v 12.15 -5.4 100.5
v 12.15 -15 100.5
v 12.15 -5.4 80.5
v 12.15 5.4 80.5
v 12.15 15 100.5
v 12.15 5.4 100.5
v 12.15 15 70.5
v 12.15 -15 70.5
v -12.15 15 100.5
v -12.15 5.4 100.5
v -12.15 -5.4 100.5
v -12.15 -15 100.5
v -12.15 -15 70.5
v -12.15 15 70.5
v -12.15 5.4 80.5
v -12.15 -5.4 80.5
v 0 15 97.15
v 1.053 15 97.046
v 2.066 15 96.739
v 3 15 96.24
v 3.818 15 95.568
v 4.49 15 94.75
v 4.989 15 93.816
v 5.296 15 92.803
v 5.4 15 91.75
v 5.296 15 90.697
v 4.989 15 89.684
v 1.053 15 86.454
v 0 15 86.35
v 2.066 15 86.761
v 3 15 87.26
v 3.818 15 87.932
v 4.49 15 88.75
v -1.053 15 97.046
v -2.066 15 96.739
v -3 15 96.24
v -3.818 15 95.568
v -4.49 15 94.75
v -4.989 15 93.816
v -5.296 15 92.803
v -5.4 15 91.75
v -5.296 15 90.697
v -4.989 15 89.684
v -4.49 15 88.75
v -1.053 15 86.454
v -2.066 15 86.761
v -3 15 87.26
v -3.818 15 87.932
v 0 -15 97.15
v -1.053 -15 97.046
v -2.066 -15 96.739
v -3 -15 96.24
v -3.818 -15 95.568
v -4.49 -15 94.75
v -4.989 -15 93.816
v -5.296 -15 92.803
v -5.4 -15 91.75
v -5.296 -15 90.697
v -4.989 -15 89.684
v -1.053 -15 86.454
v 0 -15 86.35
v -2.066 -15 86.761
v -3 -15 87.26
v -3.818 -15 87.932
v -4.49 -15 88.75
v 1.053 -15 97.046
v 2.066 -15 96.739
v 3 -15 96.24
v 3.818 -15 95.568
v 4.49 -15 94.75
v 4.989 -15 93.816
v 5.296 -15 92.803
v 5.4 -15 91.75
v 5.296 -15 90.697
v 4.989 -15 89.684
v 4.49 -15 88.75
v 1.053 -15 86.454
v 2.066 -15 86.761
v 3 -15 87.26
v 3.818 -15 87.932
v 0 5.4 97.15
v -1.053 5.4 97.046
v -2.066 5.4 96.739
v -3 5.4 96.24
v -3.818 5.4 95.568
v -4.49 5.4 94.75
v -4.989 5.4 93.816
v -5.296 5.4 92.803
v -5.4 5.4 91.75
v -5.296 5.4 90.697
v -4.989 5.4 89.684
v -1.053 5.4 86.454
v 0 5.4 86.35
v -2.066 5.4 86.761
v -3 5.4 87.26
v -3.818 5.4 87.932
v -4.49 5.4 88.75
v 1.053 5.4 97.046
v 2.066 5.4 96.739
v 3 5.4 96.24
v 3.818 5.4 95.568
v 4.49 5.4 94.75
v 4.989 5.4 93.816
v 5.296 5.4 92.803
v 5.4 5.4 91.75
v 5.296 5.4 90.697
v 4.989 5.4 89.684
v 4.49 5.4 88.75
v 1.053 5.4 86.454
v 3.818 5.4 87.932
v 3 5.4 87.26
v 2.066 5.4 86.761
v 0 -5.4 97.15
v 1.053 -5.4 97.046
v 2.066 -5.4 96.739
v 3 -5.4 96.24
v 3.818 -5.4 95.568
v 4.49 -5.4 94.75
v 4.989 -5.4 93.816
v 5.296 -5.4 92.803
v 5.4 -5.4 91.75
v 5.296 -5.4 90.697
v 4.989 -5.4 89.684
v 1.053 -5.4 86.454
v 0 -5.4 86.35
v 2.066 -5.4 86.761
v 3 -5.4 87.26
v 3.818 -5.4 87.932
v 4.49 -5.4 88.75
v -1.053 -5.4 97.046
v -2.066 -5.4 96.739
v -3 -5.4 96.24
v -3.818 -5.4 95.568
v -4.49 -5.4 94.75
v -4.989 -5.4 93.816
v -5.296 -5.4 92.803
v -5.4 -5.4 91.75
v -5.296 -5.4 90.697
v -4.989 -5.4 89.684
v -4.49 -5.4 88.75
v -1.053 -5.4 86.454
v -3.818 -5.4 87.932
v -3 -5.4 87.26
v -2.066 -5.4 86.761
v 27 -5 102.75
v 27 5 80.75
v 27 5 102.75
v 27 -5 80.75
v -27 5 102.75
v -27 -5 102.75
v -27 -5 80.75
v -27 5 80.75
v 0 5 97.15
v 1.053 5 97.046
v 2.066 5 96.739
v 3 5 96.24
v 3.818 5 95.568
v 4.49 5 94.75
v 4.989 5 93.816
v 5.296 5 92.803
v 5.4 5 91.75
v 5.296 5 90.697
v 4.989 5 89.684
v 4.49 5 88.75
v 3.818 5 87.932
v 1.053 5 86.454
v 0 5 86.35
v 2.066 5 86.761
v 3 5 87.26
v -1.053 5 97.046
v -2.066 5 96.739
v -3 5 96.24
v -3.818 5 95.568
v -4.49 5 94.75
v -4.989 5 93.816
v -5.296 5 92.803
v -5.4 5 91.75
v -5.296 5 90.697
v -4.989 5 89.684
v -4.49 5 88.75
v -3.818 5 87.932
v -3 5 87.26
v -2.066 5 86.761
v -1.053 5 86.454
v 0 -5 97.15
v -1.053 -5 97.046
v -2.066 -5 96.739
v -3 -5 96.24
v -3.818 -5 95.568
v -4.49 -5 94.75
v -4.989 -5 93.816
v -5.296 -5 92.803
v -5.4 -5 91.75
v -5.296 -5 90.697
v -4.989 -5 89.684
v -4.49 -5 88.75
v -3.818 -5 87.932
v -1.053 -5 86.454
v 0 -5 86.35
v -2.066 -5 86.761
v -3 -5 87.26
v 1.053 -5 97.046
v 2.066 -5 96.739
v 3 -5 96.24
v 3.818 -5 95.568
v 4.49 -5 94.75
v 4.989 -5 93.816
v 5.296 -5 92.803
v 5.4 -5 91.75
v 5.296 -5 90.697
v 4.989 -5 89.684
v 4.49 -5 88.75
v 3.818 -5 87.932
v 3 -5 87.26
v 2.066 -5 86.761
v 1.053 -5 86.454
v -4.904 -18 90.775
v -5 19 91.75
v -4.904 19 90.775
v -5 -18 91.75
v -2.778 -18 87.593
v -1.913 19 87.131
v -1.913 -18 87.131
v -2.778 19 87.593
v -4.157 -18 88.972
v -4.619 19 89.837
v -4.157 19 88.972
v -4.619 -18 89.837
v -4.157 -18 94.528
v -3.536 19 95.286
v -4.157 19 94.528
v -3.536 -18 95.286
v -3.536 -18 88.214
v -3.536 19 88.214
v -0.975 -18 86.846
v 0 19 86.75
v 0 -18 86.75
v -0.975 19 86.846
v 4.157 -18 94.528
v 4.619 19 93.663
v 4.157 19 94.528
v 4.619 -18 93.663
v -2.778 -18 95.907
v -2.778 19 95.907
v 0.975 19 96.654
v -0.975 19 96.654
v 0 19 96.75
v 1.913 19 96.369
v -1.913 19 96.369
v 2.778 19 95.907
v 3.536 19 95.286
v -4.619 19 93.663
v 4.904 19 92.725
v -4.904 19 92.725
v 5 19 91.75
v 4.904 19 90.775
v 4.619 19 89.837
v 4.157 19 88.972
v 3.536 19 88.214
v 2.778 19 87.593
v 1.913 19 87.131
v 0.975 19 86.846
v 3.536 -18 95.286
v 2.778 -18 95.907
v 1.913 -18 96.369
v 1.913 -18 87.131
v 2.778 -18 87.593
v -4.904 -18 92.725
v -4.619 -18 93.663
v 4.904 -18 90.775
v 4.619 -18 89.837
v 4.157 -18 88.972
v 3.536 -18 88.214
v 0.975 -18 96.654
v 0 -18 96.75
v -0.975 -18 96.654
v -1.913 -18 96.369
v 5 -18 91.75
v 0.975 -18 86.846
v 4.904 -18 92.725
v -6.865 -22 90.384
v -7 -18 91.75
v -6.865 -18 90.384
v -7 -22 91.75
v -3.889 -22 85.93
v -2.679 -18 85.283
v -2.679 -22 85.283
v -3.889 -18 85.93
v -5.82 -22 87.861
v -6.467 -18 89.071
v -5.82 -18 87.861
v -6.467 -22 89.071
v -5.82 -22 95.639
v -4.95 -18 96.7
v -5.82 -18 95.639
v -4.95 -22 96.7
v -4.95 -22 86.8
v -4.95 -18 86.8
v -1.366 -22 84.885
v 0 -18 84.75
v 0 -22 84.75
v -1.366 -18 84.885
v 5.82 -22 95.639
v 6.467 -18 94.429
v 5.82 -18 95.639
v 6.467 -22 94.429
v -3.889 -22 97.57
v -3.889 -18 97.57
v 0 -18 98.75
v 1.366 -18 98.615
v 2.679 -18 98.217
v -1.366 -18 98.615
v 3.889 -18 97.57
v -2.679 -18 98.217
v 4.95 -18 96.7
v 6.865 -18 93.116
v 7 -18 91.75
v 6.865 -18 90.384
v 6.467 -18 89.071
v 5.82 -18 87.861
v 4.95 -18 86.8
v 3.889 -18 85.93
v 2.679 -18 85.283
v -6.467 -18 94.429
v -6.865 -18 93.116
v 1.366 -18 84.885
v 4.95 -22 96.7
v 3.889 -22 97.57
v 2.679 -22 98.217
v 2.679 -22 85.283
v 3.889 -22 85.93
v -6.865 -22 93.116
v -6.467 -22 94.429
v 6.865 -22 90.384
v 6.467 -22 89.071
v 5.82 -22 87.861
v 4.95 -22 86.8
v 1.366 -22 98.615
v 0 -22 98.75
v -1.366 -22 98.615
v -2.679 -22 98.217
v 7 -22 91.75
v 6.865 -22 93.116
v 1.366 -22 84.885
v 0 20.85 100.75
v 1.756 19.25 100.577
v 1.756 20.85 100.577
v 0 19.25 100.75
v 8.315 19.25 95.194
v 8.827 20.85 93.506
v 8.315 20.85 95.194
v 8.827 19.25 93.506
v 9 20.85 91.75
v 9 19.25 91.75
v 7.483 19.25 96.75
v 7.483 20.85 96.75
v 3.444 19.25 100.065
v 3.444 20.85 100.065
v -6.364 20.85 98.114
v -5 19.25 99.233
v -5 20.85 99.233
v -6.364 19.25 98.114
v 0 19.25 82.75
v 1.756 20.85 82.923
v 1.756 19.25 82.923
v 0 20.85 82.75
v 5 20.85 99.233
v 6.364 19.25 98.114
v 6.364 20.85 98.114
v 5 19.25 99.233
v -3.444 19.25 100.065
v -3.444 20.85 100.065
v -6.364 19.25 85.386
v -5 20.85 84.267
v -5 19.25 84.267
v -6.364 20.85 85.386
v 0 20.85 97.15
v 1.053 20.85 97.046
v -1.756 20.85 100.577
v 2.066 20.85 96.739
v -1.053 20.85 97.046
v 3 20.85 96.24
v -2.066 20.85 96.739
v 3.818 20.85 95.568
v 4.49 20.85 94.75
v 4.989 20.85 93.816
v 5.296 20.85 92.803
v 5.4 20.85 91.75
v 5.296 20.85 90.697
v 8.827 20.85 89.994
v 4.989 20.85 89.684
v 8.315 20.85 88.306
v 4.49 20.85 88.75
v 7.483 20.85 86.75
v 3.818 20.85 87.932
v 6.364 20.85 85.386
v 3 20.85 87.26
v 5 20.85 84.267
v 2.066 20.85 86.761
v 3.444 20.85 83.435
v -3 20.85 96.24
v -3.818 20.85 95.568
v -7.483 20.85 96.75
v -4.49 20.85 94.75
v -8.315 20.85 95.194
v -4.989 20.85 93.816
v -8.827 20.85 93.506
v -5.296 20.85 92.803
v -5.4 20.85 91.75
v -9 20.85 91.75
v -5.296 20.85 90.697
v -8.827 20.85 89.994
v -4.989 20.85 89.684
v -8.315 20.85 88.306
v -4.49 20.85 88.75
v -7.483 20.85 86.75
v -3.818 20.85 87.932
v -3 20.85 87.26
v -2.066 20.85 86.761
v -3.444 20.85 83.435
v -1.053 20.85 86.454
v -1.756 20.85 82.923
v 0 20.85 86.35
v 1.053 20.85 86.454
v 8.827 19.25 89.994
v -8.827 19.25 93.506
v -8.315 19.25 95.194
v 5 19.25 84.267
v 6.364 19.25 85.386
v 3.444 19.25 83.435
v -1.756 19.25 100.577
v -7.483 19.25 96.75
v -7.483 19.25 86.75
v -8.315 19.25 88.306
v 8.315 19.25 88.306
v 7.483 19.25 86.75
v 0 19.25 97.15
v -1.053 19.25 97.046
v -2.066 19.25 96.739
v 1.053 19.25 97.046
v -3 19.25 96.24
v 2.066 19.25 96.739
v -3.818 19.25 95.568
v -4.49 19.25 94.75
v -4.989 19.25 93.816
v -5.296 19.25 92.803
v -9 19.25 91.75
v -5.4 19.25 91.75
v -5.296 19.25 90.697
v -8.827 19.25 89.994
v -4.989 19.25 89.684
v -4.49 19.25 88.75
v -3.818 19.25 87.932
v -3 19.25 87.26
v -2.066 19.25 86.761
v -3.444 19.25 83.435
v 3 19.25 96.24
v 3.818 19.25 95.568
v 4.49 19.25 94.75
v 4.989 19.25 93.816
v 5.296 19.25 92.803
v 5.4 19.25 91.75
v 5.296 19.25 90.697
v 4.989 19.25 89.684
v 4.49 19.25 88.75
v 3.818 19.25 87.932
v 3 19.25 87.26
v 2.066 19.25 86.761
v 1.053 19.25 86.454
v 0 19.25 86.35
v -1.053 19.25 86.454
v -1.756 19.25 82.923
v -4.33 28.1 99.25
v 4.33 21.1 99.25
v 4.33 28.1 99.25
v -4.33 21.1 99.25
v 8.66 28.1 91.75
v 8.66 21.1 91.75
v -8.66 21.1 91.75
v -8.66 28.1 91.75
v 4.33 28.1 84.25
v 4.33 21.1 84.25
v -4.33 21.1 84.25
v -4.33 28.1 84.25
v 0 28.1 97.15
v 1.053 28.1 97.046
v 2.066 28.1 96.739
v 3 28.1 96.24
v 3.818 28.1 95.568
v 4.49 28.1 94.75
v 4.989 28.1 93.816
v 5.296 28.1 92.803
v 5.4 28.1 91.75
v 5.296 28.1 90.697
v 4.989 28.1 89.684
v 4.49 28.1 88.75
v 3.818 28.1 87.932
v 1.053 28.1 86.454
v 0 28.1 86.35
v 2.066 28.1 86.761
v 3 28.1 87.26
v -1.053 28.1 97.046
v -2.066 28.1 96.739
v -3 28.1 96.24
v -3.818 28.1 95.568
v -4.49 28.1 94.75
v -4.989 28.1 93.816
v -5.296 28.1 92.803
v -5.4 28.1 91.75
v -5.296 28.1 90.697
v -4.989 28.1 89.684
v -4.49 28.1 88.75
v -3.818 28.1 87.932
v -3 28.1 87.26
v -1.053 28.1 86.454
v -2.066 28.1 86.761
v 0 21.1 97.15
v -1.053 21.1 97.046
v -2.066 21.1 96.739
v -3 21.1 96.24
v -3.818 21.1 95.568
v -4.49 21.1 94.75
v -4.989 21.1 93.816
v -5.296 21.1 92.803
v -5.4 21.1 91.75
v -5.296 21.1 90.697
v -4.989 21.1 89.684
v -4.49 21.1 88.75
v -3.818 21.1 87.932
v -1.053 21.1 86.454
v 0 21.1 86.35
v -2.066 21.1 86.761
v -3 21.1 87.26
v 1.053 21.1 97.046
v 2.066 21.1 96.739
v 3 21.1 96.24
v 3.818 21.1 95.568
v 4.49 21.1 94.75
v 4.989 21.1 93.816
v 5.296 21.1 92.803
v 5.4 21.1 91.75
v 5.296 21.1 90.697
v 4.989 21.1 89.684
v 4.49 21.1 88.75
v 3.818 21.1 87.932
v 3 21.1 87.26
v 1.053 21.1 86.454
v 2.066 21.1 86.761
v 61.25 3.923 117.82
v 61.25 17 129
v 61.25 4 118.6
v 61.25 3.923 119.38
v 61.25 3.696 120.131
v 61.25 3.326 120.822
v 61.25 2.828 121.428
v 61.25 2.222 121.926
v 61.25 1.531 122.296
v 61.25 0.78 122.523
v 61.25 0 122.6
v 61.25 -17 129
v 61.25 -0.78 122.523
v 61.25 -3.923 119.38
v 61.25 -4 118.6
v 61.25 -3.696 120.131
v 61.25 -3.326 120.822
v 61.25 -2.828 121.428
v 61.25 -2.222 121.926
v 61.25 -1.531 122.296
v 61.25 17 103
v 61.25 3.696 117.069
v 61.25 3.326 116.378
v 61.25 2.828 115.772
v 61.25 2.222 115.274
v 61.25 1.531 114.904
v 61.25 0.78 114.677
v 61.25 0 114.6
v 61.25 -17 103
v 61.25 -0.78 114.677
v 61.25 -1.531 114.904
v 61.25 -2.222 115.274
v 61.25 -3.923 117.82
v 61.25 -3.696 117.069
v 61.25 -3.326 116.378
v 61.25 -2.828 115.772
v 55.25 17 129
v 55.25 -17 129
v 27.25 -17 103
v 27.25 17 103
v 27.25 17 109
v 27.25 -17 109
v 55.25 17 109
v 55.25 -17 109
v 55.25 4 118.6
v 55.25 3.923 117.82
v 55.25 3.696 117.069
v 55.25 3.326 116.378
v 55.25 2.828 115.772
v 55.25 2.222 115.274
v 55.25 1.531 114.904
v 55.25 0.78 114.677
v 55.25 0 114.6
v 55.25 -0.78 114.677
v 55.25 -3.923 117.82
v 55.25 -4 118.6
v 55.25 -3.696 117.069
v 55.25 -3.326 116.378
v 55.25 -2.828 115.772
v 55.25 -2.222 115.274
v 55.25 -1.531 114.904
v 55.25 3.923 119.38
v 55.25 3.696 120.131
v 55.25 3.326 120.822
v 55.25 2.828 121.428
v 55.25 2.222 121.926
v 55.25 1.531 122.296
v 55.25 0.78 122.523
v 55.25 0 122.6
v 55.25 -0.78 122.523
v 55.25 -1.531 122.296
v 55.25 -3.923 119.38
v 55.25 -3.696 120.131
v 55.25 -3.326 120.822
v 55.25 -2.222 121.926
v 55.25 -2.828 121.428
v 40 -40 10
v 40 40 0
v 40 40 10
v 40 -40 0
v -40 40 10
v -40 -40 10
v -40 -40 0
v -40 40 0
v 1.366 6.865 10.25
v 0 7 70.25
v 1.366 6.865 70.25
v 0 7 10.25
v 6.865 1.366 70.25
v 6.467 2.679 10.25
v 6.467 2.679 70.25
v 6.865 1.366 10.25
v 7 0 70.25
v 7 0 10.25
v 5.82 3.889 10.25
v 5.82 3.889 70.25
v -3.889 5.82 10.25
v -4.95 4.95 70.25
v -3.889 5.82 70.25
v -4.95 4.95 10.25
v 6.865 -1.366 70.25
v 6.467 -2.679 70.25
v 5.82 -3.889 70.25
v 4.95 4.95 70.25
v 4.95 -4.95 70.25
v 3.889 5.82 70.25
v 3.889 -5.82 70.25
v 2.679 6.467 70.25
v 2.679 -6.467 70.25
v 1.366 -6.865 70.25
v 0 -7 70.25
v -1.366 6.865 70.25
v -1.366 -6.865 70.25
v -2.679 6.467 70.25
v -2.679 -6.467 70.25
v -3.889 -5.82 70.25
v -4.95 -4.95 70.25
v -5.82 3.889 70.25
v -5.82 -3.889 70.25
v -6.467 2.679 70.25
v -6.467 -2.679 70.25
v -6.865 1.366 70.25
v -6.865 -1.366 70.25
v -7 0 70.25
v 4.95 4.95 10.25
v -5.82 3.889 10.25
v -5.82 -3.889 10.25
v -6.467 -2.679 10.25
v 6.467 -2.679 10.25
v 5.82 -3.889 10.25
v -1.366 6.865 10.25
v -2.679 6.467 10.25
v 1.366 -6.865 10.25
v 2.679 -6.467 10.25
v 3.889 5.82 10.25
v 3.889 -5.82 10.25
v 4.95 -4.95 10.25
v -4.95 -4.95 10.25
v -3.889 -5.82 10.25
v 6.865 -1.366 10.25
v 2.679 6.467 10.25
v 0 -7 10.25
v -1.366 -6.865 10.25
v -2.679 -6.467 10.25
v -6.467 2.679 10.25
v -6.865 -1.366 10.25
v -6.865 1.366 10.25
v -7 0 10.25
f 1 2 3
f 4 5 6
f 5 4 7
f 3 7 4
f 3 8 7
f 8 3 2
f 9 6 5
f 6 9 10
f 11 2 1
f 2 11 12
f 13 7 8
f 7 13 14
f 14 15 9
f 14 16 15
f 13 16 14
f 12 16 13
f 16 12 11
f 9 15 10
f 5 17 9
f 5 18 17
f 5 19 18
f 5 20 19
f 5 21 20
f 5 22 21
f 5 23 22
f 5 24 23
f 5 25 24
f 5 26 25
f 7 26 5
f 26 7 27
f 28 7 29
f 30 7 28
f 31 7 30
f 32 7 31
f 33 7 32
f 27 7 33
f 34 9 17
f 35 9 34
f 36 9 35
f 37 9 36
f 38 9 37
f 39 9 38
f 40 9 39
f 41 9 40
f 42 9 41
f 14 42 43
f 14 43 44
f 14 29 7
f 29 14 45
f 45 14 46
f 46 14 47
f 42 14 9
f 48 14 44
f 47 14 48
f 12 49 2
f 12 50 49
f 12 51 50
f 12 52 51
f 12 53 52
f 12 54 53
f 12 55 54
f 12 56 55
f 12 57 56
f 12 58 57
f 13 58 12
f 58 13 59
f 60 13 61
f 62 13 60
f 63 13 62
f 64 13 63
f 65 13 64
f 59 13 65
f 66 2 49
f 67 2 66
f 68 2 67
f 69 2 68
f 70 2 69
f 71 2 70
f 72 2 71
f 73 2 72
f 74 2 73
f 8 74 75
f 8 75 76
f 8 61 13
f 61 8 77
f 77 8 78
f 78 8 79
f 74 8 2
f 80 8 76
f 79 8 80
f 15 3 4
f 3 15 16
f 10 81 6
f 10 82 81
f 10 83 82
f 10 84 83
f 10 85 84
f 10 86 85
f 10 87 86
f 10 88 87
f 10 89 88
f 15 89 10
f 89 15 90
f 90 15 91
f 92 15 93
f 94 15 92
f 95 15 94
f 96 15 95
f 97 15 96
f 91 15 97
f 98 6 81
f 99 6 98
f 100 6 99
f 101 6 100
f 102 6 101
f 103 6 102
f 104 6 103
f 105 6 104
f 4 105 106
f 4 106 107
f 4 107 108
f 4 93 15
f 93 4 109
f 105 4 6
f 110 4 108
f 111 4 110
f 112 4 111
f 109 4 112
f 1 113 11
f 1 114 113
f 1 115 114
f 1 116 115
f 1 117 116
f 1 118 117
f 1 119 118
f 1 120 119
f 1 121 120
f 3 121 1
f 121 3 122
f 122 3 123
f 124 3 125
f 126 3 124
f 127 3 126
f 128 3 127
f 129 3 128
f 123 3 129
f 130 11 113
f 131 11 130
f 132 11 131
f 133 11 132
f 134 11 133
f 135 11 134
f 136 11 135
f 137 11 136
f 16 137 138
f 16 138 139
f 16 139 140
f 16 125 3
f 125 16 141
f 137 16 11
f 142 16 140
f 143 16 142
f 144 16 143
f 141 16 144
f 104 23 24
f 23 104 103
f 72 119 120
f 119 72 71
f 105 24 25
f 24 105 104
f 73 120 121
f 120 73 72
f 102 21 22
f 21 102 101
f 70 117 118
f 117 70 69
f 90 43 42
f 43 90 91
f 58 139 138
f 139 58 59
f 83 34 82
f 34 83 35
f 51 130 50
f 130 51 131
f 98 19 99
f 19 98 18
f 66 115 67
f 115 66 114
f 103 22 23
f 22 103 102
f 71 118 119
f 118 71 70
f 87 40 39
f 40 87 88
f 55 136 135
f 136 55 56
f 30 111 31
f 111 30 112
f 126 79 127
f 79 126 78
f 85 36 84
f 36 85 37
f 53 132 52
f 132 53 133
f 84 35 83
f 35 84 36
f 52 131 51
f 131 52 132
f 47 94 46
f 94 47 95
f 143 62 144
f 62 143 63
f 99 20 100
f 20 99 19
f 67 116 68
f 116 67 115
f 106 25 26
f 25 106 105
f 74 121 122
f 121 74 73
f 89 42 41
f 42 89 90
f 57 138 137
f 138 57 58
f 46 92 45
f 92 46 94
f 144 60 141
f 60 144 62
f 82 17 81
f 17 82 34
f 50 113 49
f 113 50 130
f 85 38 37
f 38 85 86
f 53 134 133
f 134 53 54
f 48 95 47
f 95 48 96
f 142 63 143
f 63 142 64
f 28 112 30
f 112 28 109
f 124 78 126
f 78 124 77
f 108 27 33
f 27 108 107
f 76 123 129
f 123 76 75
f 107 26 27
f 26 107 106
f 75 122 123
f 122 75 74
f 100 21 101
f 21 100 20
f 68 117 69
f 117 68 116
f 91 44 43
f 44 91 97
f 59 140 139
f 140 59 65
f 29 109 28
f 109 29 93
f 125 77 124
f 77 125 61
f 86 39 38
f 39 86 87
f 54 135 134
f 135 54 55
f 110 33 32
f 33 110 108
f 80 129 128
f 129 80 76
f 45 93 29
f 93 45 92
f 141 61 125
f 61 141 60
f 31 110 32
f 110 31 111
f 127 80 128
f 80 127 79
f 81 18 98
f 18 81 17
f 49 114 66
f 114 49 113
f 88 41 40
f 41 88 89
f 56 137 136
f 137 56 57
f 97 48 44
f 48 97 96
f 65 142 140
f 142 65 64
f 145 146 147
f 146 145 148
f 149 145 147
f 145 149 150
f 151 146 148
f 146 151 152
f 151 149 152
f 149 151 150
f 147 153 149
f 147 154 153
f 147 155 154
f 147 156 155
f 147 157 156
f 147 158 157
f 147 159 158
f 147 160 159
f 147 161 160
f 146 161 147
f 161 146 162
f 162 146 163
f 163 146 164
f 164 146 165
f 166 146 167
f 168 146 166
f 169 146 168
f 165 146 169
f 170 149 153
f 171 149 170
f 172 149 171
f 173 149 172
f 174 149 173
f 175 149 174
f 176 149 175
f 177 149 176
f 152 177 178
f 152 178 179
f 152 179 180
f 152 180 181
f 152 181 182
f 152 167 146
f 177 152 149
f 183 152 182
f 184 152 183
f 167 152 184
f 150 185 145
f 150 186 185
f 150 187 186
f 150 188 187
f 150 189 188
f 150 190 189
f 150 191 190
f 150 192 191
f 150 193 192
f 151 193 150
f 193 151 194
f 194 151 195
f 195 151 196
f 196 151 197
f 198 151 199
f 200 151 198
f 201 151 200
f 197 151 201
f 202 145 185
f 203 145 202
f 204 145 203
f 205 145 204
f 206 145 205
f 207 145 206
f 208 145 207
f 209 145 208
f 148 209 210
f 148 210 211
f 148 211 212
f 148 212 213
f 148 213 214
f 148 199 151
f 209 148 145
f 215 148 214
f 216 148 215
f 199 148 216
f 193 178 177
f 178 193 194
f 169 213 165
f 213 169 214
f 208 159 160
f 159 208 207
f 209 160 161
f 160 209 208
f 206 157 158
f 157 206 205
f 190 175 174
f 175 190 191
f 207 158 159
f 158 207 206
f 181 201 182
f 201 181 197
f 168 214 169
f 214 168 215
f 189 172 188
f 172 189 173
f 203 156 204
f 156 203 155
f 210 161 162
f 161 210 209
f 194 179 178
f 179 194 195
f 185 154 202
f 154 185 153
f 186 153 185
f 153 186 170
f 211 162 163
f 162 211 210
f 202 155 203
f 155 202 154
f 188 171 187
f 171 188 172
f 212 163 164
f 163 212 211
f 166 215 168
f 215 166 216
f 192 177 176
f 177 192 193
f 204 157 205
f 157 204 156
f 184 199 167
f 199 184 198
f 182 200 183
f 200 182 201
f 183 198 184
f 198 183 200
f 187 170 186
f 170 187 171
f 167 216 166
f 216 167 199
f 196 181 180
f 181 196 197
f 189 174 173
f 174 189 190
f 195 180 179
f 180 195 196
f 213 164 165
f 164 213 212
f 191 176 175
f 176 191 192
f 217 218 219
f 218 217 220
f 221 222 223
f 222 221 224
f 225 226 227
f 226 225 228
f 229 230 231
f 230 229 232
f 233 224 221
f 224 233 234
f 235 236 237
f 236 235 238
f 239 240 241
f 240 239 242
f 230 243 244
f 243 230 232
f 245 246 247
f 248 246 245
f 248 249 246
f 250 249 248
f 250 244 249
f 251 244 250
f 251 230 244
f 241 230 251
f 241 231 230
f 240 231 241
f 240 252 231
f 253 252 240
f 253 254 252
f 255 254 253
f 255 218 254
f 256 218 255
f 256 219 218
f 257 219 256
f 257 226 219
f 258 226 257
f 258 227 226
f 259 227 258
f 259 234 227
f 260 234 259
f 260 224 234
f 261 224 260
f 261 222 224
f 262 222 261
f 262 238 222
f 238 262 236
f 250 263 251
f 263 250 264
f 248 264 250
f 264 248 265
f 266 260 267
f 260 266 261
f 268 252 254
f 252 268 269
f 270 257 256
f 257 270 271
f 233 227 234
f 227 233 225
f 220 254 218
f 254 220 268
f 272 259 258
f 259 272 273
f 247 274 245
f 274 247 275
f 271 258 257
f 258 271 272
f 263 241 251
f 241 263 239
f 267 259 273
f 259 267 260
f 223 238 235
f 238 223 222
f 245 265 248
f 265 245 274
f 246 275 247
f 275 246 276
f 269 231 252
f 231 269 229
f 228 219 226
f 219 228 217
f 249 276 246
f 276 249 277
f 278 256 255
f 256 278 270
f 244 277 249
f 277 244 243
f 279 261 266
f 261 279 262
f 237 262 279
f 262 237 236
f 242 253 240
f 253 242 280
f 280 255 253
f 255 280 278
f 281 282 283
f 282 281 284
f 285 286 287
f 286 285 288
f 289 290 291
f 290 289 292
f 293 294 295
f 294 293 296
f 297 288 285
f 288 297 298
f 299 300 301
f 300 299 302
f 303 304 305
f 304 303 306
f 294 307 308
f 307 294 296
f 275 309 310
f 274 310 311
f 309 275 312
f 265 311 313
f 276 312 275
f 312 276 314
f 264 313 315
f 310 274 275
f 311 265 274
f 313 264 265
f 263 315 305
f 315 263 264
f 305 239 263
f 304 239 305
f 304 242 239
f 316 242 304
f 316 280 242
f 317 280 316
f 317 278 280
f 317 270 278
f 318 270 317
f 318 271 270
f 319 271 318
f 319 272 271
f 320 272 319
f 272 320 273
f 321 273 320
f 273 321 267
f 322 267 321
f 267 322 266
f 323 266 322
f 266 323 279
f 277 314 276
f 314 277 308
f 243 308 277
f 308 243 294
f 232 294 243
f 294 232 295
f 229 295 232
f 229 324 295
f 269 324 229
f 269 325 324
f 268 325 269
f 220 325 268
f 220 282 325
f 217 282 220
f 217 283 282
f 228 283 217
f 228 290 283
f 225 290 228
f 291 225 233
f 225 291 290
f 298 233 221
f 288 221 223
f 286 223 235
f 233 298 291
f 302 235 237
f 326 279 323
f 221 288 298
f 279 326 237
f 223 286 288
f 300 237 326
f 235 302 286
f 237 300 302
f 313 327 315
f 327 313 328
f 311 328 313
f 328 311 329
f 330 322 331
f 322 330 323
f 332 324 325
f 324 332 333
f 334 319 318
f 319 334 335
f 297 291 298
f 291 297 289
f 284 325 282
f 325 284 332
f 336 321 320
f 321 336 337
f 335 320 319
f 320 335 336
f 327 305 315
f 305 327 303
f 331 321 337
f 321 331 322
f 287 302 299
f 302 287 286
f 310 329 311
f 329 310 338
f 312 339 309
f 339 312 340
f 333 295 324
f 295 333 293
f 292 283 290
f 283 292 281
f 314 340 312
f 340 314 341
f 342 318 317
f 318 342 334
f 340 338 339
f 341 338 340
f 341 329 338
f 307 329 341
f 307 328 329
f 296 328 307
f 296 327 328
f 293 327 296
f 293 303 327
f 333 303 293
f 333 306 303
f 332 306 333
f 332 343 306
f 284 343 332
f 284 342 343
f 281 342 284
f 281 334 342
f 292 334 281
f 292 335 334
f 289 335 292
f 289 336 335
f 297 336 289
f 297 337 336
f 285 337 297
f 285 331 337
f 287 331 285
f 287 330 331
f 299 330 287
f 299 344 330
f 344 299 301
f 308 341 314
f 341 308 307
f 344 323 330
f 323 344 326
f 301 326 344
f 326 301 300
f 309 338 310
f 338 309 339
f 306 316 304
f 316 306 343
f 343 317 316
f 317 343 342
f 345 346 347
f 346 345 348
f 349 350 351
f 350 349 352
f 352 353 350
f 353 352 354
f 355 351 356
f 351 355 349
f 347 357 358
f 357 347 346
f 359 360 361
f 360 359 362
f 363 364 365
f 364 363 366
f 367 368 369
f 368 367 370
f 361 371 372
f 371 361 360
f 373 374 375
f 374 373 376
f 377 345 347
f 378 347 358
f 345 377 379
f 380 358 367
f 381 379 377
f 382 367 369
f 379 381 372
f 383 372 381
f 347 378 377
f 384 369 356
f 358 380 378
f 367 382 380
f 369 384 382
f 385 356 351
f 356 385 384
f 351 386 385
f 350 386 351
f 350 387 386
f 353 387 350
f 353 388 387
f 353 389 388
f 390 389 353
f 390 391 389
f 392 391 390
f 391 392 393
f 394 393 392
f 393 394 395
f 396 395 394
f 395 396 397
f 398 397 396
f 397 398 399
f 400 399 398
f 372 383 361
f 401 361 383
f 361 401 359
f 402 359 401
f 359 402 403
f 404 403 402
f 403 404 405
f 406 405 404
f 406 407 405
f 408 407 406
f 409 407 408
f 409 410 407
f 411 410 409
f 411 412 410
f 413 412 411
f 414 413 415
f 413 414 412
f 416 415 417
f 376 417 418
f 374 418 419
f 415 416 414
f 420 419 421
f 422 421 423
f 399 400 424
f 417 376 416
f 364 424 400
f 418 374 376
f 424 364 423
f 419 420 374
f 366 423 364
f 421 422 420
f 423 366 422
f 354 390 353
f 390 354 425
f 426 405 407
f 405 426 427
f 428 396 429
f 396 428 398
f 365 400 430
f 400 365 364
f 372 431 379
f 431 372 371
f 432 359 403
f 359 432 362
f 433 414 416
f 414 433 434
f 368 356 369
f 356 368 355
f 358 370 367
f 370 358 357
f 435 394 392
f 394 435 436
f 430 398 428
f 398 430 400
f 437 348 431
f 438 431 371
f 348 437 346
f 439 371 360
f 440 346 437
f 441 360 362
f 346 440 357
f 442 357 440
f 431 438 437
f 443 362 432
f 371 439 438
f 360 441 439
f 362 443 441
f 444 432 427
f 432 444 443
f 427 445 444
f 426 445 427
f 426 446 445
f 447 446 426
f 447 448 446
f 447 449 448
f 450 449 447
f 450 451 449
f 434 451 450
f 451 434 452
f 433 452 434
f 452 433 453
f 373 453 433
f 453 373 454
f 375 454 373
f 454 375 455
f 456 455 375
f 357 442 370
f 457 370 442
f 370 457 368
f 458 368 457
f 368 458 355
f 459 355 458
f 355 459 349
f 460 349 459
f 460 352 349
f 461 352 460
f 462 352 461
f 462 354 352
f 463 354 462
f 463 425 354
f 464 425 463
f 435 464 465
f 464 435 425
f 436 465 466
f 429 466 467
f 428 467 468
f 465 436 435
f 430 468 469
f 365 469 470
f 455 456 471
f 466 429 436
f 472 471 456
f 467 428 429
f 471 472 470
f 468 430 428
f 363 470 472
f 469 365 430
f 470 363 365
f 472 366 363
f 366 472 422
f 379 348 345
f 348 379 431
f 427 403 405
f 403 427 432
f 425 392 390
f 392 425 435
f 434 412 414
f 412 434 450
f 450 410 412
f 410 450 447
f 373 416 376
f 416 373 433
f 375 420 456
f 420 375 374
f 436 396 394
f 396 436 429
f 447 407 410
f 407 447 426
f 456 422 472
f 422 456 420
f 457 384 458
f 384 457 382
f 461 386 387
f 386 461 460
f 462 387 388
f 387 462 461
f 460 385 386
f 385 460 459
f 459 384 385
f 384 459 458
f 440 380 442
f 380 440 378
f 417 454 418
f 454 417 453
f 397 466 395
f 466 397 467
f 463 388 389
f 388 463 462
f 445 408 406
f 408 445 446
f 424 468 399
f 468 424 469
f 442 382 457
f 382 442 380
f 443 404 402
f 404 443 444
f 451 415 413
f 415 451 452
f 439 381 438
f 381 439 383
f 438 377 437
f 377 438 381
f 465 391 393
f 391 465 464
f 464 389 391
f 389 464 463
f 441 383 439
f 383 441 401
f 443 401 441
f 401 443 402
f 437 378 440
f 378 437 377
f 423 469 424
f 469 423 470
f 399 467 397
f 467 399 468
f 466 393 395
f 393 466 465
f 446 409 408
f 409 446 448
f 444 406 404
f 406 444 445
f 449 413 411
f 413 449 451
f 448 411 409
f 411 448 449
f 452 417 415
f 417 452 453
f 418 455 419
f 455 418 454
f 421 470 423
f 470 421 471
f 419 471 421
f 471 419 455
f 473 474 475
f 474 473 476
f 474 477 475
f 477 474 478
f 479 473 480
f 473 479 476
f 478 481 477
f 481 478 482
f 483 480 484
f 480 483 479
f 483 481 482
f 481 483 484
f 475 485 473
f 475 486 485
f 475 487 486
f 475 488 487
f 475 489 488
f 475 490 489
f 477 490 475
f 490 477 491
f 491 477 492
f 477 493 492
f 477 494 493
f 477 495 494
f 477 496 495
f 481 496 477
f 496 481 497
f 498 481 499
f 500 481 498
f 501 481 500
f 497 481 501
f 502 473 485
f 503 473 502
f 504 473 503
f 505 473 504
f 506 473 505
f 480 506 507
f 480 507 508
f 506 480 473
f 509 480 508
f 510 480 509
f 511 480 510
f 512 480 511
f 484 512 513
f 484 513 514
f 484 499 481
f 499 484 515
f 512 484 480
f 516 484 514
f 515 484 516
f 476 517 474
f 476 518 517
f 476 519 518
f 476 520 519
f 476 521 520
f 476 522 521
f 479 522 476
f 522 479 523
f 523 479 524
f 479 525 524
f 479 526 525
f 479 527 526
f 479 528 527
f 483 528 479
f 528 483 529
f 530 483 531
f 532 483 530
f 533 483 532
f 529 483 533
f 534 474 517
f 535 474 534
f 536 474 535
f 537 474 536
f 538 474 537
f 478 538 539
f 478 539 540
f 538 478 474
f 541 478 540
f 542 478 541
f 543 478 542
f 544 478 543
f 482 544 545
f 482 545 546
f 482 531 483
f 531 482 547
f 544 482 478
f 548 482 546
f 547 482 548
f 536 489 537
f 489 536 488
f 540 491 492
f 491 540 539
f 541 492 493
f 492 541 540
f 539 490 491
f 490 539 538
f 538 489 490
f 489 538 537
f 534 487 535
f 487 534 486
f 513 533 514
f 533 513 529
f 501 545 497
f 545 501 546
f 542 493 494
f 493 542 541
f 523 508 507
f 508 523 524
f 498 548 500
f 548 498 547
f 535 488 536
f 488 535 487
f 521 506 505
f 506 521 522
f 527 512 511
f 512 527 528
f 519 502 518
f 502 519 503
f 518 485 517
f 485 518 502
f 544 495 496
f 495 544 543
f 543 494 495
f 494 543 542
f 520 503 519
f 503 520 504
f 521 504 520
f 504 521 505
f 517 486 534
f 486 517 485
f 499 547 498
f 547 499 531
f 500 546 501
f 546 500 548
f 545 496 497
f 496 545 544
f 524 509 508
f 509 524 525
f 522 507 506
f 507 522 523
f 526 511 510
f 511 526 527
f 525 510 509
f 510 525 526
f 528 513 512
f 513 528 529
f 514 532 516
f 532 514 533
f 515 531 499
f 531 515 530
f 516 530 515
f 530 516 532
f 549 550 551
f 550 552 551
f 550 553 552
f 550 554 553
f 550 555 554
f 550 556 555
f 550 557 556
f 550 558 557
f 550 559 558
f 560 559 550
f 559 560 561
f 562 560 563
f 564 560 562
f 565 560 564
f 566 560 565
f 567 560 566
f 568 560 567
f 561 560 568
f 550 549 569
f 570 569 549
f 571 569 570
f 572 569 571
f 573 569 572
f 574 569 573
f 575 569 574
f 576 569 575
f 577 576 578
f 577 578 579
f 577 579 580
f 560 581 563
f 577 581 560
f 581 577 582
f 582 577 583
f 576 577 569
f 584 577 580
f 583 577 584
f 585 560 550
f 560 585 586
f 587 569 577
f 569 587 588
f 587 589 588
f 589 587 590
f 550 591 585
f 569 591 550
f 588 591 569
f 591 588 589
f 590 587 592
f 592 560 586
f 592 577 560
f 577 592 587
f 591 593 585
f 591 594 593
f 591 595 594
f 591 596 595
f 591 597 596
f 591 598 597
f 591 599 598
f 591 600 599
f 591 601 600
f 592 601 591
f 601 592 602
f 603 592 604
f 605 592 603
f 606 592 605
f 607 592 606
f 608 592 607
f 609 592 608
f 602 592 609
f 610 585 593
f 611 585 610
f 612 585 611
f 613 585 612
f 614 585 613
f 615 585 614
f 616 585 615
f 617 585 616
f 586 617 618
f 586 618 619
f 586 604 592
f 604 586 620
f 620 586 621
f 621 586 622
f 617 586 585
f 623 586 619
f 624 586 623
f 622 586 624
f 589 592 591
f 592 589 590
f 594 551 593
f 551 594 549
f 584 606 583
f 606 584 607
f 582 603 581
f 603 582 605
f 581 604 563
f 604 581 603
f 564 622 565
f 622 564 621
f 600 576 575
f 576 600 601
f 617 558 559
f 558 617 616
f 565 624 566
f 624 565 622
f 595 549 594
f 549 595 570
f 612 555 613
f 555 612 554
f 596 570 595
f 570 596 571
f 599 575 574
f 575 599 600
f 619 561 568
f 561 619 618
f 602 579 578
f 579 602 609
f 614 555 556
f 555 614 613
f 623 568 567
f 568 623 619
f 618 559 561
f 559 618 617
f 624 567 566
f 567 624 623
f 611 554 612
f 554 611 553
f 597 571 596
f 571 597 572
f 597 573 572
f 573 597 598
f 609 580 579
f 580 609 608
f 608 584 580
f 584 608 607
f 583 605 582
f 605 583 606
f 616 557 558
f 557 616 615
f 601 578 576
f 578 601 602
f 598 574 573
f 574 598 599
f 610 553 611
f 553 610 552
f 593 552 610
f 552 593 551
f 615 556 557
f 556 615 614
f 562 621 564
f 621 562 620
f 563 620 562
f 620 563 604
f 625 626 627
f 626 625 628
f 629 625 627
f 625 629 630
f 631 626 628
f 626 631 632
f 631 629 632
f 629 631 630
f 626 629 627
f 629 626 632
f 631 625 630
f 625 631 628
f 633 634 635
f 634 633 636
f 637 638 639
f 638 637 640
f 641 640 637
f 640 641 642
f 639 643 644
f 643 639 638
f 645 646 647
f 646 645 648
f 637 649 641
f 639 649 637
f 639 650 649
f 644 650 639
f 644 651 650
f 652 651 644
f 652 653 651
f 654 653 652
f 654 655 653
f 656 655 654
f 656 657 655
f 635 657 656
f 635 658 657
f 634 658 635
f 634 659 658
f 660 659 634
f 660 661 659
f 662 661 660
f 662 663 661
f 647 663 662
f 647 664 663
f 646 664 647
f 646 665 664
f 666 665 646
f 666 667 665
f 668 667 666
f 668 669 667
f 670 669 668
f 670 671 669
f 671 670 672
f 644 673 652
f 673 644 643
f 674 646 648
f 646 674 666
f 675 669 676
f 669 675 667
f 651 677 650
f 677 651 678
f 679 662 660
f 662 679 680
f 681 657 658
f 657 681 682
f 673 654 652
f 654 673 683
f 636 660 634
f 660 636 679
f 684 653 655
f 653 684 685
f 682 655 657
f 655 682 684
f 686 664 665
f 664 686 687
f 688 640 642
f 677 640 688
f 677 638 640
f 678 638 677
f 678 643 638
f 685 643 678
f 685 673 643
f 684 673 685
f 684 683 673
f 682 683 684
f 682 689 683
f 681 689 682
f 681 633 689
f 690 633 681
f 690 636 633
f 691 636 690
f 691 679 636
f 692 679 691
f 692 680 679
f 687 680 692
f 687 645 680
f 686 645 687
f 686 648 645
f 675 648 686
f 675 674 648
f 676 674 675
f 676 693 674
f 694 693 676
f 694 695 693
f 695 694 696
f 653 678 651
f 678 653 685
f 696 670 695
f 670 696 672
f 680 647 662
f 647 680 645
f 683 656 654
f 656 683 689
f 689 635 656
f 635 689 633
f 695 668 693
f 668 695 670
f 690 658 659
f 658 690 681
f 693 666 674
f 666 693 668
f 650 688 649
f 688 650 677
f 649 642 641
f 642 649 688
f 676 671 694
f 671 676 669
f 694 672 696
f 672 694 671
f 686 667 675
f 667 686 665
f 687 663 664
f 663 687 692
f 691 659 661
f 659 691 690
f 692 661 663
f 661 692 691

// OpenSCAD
$fn = 32;

// ------------------------------------------------------------------------
// Lamp arm: column d14 x 60 mm, arm 54 mm
// Every part is its own module, assembly() places every instance.
// ------------------------------------------------------------------------

// --- part 1 ---
module lamp_base() {
  difference() {
    translate([-40, -40, 0]) cube([80, 80, 10]);
  }
}

// --- part 2 ---
module lamp_column() {
  cylinder(h = 60, d = 14);
}

// --- part 3 ---
module head_fork() {
  difference() {
    translate([-12.15, -15, 0]) cube([24.3, 30, 30]);
    translate([-13.15, -5.4, 10]) cube([26.3, 10.8, 21]);
    translate([0, 0, 21.25]) rotate([90, 0, 0]) cylinder(h = 32, d = 10.8, center = true);
  }
}

// --- part 4 ---
module lamp_arm() {
  difference() {
    translate([-27, -5, 0]) cube([54, 10, 22]);
    translate([0, 0, 11]) rotate([90, 0, 0]) cylinder(h = 12, d = 10.8, center = true);
  }
}

// --- part 5 ---
module arm_pin() {
  rotate([0, 90, 0]) cylinder(h = 38, d = 10, center = true);
  translate([-22, 0, 0]) rotate([0, 90, 0]) cylinder(h = 4, d = 14);
}

// --- part 6 ---
module arm_washer() {
  difference() {
      translate([0, 0, 0]) cylinder(h = 1.6, d = 18);
      translate([0, 0, -1]) cylinder(h = 3.6, d = 10.8);
    }
}

// --- part 7 ---
module arm_nut() {
  difference() {
    linear_extrude(height = 7) polygon(points = [[8.66, 0], [4.33, 7.5], [-4.33, 7.5], [-8.66, 0], [-4.33, -7.5], [4.33, -7.5]]);
    translate([0, 0, -1]) cylinder(h = 9, d = 10.8);
  }
}

// --- part 8 ---
module shade_bracket() {
  difference() {
    translate([-17, -17, 0]) cube([34, 34, 26]);
    translate([-18, -18, 6]) cube([29, 36, 21]);
    translate([14, 0, 15.6]) rotate([0, 90, 0]) cylinder(h = 8, d = 8, center = true);
  }
}

// --- assembly ---
module assembly() {
  color([0.80, 0.24, 0.20]) translate([0, 0, 0]) rotate([0, 0, 0]) lamp_base();
  color([0.20, 0.45, 0.75]) translate([0, 0, 10.25]) rotate([0, 0, 0]) lamp_column();
  color([0.25, 0.62, 0.32]) translate([0, 0, 70.5]) rotate([0, 0, 0]) head_fork();
  color([0.92, 0.70, 0.18]) translate([0, 0, 80.75]) rotate([0, 0, 0]) lamp_arm();
  color([0.58, 0.35, 0.70]) translate([0, 0, 91.75]) rotate([0, 0, 90]) arm_pin();
  color([0.16, 0.66, 0.66]) translate([0, 20.85, 91.75]) rotate([90, 0, 0]) arm_washer();
  color([0.85, 0.48, 0.18]) translate([0, 28.1, 91.75]) rotate([90, 0, 0]) arm_nut();
  color([0.55, 0.60, 0.65]) translate([44.25, 0, 103]) rotate([0, 0, 0]) shade_bracket();
}

assembly();
